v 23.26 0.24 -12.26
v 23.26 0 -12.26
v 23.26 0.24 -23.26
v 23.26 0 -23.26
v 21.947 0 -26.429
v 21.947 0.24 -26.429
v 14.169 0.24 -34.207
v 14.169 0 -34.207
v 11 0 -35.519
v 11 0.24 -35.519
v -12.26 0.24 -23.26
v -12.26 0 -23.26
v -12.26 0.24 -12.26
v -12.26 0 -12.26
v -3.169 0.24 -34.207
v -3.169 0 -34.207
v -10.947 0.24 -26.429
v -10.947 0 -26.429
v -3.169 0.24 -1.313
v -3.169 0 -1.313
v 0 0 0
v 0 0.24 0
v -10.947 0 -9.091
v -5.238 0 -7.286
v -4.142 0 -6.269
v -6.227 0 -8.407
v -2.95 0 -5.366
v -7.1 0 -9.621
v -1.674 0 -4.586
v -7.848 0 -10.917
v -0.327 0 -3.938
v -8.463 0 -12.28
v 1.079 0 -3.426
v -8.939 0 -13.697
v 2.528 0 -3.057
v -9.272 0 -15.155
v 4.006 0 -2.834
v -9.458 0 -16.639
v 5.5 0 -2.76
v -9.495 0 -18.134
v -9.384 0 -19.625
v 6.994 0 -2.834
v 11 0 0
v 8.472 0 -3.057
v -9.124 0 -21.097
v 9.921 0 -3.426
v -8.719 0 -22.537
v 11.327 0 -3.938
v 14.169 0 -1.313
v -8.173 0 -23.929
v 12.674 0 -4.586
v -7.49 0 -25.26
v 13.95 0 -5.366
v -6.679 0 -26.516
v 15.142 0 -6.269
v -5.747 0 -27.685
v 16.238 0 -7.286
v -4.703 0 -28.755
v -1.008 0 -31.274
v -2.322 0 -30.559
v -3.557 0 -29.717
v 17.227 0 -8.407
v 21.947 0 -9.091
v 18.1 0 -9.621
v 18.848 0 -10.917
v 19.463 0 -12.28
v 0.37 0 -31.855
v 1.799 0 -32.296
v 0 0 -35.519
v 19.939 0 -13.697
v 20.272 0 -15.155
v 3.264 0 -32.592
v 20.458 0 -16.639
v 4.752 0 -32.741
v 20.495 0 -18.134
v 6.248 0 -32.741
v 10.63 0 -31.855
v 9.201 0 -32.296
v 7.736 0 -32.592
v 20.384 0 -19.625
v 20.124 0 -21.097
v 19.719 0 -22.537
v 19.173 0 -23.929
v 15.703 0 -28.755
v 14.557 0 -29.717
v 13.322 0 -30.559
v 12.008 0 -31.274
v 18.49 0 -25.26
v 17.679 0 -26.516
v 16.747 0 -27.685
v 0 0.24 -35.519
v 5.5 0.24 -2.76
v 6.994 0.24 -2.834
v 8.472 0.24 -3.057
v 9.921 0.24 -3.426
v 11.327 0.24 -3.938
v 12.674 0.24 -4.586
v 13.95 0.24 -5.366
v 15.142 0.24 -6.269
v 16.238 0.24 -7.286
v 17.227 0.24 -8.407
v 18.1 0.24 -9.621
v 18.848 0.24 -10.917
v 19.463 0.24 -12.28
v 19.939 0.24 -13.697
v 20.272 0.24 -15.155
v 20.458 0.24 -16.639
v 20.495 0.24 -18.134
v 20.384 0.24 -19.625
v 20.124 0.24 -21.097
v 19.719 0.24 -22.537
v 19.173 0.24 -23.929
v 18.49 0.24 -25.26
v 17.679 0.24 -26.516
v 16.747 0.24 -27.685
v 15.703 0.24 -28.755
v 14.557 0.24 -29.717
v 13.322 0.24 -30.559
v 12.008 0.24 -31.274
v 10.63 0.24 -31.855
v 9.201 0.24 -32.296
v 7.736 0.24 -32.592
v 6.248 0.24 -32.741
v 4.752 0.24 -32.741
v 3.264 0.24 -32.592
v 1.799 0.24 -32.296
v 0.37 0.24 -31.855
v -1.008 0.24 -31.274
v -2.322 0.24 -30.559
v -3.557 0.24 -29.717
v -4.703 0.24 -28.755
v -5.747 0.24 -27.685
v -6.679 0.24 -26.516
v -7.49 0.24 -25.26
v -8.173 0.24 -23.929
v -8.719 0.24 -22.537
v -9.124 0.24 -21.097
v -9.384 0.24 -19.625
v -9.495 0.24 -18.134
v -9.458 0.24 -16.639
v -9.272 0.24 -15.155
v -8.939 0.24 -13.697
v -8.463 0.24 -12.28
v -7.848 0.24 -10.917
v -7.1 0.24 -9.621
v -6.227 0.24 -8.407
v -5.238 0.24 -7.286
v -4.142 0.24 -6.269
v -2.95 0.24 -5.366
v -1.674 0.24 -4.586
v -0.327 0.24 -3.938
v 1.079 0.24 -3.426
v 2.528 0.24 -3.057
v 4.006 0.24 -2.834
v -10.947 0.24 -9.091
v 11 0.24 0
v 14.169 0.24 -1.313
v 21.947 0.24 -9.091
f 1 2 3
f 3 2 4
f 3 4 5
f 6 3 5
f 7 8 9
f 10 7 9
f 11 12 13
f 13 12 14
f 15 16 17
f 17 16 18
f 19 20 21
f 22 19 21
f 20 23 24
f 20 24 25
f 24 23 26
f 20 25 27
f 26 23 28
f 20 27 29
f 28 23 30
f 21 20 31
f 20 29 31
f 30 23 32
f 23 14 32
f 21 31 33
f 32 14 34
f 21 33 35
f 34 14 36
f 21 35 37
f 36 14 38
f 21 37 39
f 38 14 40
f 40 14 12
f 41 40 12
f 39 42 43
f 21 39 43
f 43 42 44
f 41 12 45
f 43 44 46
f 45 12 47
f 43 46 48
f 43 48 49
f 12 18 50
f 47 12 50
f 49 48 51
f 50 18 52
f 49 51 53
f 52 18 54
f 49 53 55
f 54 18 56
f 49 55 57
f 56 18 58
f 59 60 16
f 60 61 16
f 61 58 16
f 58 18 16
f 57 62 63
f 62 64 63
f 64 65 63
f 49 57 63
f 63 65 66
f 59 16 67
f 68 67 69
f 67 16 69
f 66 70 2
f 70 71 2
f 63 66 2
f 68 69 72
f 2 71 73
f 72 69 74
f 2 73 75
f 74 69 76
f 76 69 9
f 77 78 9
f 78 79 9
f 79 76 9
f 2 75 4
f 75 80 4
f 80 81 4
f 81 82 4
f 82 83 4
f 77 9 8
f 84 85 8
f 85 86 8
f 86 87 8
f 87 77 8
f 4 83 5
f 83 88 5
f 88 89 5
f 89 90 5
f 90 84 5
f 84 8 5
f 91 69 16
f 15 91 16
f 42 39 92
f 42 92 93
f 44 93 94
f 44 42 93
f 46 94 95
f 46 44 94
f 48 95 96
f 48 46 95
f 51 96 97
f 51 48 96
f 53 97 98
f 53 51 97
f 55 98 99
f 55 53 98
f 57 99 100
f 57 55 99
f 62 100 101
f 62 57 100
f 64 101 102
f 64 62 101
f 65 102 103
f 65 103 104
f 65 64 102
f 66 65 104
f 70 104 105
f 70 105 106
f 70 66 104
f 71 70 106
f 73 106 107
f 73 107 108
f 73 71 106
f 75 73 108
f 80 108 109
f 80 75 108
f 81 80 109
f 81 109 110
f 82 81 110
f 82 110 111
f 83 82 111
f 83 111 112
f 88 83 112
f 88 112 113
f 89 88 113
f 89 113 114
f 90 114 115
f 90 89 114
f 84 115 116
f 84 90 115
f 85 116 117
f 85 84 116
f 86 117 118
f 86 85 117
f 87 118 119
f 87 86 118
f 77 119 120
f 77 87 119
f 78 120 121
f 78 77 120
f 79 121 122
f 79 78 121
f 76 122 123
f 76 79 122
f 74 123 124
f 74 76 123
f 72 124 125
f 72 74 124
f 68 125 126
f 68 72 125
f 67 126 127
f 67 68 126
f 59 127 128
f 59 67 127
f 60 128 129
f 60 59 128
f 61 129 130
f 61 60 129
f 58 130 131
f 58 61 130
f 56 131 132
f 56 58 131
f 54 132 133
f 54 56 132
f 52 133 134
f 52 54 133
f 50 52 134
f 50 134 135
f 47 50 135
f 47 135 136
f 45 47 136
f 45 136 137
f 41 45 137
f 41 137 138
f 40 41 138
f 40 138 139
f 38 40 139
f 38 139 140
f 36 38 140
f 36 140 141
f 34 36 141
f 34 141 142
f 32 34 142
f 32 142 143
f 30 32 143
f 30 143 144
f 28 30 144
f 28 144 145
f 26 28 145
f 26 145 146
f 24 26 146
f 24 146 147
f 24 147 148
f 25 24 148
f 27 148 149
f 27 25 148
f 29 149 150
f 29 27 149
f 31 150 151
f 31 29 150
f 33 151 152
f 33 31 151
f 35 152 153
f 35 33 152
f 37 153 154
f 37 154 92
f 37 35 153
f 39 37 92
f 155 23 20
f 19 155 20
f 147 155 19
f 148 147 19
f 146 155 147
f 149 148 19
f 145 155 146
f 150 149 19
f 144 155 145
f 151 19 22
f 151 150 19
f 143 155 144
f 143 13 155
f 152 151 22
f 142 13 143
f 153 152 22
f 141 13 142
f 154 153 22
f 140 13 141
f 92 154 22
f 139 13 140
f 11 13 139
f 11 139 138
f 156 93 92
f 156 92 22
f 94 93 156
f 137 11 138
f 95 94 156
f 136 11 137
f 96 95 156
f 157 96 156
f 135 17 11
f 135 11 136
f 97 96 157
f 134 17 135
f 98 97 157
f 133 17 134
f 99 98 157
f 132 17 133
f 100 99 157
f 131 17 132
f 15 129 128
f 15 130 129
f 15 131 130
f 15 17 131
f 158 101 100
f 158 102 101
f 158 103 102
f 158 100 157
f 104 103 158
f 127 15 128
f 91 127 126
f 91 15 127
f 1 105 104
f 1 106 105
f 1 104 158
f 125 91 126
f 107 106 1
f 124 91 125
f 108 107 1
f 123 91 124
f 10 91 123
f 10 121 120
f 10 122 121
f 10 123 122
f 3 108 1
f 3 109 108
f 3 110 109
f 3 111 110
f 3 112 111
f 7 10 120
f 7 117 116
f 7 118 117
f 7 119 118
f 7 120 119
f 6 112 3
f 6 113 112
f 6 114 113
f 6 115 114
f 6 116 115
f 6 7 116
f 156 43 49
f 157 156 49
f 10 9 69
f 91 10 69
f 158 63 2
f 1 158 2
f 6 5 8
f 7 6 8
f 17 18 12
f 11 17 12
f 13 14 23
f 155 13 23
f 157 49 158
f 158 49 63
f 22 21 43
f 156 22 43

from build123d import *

# Parameters (mm, degrees)
SKETCH1_R           = 15
BOSS_EXTRUDE1_DEPTH = 0.24


with BuildPart() as part:
    # Sketch1 → Boss-Extrude1 (new body)
    with BuildSketch(Plane(origin=(0, 0, 0), x_dir=(1, 0, 0), z_dir=(0, 1, 0))):
        Polygon((0, 0), (11, 0), (14.168906797, 1.312604173), (21.94708139, 9.090778766), (23.259685563, 12.259685563), (23.259685563, 23.259685563), (21.94708139, 26.428592359), (14.168906797, 34.206766952), (11, 35.519371125), (0, 35.519371125), (-3.168906797, 34.206766952), (-10.94708139, 26.428592359), (-12.259685563, 23.259685563), (-12.259685563, 12.259685563), (-10.94708139, 9.090778766), (-3.168906797, 1.312604173), align=None)
        with Locations(Location((5.5, 17.759685563, 0), (0, 0, 270))):
            Circle(SKETCH1_R, mode=Mode.SUBTRACT)
    extrude(amount=BOSS_EXTRUDE1_DEPTH)


solid = part.part
